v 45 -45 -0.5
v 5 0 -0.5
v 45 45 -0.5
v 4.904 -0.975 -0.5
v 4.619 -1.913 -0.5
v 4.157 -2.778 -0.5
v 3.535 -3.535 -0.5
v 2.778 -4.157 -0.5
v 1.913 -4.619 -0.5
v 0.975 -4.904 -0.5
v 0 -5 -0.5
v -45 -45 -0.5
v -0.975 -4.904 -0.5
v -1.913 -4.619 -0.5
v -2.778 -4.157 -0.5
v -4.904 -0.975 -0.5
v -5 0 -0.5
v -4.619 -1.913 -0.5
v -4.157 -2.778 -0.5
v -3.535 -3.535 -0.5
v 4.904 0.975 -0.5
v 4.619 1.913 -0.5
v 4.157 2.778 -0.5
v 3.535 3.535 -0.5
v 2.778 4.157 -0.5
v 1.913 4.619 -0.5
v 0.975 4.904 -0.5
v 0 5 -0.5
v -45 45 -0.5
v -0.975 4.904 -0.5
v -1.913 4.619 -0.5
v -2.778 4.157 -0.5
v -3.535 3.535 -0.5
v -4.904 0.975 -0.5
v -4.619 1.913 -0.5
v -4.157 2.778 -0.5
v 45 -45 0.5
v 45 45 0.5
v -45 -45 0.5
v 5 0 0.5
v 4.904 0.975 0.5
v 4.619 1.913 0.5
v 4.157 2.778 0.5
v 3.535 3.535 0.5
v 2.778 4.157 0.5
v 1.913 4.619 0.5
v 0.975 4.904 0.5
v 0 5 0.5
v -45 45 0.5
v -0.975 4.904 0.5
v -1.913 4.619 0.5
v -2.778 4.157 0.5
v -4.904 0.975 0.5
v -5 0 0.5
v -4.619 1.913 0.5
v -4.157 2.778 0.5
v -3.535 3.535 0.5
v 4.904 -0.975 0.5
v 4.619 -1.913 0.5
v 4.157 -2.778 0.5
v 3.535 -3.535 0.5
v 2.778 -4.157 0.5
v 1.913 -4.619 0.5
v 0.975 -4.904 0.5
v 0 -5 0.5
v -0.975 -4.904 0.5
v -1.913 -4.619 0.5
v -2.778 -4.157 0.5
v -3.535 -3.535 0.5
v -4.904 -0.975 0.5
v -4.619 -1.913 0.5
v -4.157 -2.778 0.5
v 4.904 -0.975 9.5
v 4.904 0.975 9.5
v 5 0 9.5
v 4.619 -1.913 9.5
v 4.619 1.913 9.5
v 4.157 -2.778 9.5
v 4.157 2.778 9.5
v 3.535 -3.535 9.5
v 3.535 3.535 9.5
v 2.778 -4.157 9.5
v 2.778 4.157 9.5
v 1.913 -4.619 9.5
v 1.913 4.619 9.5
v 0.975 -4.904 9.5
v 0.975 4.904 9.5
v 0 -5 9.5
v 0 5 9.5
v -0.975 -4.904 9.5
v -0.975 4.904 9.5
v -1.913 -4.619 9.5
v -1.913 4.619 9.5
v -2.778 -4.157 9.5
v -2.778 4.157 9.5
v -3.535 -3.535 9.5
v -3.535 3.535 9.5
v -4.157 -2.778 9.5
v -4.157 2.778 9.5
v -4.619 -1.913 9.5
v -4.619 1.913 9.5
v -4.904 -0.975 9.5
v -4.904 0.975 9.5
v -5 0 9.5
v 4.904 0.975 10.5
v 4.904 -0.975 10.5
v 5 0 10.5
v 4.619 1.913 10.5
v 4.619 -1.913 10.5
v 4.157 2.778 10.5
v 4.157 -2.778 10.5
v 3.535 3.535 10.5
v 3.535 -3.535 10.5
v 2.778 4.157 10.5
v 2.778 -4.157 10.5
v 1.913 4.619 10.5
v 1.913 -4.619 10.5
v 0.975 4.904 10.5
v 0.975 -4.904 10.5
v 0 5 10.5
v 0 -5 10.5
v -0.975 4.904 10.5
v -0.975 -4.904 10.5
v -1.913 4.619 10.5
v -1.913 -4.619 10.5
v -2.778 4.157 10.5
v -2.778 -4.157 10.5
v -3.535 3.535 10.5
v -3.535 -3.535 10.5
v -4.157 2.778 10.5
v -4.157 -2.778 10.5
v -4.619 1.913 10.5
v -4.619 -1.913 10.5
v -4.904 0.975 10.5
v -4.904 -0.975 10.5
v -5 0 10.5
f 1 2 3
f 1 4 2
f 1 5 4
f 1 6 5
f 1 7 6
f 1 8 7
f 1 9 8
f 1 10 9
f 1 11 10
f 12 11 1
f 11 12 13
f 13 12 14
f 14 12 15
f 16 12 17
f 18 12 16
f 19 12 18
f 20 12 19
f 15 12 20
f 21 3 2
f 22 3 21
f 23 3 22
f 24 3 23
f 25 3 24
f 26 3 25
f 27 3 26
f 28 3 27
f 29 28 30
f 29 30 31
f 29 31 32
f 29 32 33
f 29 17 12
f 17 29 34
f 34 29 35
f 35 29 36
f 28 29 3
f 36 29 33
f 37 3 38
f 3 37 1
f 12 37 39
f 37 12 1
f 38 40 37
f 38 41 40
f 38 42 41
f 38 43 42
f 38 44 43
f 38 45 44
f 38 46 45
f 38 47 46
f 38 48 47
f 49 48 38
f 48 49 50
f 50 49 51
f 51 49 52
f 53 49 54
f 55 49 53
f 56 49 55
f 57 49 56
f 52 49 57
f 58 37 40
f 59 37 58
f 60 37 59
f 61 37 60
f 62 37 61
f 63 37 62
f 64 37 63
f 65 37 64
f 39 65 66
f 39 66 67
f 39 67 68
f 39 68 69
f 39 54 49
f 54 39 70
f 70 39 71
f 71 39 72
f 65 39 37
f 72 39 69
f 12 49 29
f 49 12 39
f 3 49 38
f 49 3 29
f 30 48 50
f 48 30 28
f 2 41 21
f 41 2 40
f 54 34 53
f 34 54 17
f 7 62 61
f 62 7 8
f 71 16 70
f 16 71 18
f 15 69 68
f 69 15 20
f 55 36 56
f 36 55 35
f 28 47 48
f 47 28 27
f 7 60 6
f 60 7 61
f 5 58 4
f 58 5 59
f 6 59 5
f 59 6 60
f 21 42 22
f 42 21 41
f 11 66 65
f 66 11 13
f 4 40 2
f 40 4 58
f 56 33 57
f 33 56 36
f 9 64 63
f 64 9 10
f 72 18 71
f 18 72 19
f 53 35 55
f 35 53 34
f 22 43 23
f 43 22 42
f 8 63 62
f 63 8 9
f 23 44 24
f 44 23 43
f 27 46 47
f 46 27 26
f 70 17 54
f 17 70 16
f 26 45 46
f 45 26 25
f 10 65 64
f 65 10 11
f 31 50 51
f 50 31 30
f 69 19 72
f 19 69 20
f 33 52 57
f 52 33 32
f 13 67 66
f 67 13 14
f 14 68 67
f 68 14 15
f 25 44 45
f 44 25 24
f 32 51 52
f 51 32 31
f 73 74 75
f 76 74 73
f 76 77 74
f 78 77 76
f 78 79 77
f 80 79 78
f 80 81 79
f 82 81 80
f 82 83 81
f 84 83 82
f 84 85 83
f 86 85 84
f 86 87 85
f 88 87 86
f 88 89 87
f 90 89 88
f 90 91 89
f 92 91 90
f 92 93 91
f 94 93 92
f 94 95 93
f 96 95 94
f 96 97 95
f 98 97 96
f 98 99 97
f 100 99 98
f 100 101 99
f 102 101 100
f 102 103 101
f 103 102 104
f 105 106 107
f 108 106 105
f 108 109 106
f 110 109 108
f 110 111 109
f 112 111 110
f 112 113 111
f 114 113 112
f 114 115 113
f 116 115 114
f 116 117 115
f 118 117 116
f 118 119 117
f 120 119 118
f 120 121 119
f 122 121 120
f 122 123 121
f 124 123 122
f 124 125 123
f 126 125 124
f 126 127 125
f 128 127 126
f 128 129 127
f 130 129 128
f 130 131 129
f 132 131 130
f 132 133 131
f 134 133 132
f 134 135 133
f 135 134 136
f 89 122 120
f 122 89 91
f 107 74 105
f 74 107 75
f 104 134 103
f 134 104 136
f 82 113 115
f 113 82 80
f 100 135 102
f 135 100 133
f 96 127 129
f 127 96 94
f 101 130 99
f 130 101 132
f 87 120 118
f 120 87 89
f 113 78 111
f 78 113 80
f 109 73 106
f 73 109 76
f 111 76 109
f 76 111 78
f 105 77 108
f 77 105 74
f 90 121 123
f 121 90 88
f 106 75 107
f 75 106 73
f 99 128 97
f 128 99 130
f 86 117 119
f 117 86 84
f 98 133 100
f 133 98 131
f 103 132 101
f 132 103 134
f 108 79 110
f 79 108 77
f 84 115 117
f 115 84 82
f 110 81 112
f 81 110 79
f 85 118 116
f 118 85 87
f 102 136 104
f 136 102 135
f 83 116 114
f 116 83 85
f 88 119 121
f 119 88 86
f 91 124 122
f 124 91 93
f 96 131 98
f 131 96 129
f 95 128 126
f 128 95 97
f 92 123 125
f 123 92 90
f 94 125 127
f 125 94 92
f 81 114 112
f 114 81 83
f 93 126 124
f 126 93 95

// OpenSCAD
union()
{
    difference()
    {
        linear_extrude(height = 1.0, twist = 0.0, scale = 1.0, slices = 1, center = true)
        {
            scale([90.0, 90.0])
            {
                M95();
            }
        }
        linear_extrude(height = 20.0, twist = 0.0, scale = 1.0, slices = 1, center = true)
        {
            scale([10.0, 10.0])
            {
                M51();
            }
        }
    }
    translate([0.0, 0.0, 10.0])
    {
        intersection()
        {
            linear_extrude(height = 1.0, twist = 0.0, scale = 1.0, slices = 1, center = true)
            {
                scale([90.0, 90.0])
                {
                    M95();
                }
            }
            linear_extrude(height = 20.0, twist = 0.0, scale = 1.0, slices = 1, center = true)
            {
                scale([10.0, 10.0])
                {
                    M51();
                }
            }
        }
    }
}

module M51()
{
    polygon
    (
        points =
        [
            [0.5, 0.0], 
            [0.4903926402016152, 0.09754516100806412], 
            [0.46193976625564337, 0.1913417161825449], 
            [0.4157348061512726, 0.2777851165098011], 
            [0.3535533905932738, 0.35355339059327373], 
            [0.27778511650980114, 0.4157348061512726], 
            [0.19134171618254492, 0.46193976625564337], 
            [0.09754516100806417, 0.4903926402016152], 
            [3.061616997868383E-17, 0.5], 
            [-0.0975451610080641, 0.4903926402016152], 
            [-0.19134171618254486, 0.46193976625564337], 
            [-0.277785116509801, 0.41573480615127273], 
            [-0.35355339059327373, 0.3535533905932738], 
            [-0.4157348061512727, 0.2777851165098011], 
            [-0.46193976625564337, 0.19134171618254495], 
            [-0.4903926402016152, 0.0975451610080643], 
            [-0.5, 6.123233995736766E-17], 
            [-0.4903926402016152, -0.09754516100806418], 
            [-0.4619397662556434, -0.19134171618254484], 
            [-0.41573480615127273, -0.277785116509801], 
            [-0.35355339059327384, -0.35355339059327373], 
            [-0.2777851165098011, -0.4157348061512726], 
            [-0.19134171618254517, -0.46193976625564326], 
            [-0.09754516100806433, -0.49039264020161516], 
            [-9.184850993605148E-17, -0.5], 
            [0.09754516100806415, -0.4903926402016152], 
            [0.191341716182545, -0.4619397662556433], 
            [0.2777851165098009, -0.41573480615127273], 
            [0.3535533905932737, -0.35355339059327384], 
            [0.4157348061512726, -0.2777851165098011], 
            [0.46193976625564326, -0.1913417161825452], 
            [0.49039264020161516, -0.09754516100806436]
        ],
        paths =
        [
            [0, 1, 2, 3, 4, 5, 6, 7, 8, 9, 10, 11, 12, 13, 14, 15, 16, 17, 18, 19, 20, 21, 22, 23, 24, 25, 26, 27, 28, 29, 30, 31]
        ]
    );
}

module M95()
{
    polygon
    (
        points =
        [
            [-0.5, -0.5], 
            [0.5, -0.5], 
            [0.5, 0.5], 
            [-0.5, 0.5]
        ],
        paths =
        [
            [0, 1, 2, 3]
        ]
    );
}
